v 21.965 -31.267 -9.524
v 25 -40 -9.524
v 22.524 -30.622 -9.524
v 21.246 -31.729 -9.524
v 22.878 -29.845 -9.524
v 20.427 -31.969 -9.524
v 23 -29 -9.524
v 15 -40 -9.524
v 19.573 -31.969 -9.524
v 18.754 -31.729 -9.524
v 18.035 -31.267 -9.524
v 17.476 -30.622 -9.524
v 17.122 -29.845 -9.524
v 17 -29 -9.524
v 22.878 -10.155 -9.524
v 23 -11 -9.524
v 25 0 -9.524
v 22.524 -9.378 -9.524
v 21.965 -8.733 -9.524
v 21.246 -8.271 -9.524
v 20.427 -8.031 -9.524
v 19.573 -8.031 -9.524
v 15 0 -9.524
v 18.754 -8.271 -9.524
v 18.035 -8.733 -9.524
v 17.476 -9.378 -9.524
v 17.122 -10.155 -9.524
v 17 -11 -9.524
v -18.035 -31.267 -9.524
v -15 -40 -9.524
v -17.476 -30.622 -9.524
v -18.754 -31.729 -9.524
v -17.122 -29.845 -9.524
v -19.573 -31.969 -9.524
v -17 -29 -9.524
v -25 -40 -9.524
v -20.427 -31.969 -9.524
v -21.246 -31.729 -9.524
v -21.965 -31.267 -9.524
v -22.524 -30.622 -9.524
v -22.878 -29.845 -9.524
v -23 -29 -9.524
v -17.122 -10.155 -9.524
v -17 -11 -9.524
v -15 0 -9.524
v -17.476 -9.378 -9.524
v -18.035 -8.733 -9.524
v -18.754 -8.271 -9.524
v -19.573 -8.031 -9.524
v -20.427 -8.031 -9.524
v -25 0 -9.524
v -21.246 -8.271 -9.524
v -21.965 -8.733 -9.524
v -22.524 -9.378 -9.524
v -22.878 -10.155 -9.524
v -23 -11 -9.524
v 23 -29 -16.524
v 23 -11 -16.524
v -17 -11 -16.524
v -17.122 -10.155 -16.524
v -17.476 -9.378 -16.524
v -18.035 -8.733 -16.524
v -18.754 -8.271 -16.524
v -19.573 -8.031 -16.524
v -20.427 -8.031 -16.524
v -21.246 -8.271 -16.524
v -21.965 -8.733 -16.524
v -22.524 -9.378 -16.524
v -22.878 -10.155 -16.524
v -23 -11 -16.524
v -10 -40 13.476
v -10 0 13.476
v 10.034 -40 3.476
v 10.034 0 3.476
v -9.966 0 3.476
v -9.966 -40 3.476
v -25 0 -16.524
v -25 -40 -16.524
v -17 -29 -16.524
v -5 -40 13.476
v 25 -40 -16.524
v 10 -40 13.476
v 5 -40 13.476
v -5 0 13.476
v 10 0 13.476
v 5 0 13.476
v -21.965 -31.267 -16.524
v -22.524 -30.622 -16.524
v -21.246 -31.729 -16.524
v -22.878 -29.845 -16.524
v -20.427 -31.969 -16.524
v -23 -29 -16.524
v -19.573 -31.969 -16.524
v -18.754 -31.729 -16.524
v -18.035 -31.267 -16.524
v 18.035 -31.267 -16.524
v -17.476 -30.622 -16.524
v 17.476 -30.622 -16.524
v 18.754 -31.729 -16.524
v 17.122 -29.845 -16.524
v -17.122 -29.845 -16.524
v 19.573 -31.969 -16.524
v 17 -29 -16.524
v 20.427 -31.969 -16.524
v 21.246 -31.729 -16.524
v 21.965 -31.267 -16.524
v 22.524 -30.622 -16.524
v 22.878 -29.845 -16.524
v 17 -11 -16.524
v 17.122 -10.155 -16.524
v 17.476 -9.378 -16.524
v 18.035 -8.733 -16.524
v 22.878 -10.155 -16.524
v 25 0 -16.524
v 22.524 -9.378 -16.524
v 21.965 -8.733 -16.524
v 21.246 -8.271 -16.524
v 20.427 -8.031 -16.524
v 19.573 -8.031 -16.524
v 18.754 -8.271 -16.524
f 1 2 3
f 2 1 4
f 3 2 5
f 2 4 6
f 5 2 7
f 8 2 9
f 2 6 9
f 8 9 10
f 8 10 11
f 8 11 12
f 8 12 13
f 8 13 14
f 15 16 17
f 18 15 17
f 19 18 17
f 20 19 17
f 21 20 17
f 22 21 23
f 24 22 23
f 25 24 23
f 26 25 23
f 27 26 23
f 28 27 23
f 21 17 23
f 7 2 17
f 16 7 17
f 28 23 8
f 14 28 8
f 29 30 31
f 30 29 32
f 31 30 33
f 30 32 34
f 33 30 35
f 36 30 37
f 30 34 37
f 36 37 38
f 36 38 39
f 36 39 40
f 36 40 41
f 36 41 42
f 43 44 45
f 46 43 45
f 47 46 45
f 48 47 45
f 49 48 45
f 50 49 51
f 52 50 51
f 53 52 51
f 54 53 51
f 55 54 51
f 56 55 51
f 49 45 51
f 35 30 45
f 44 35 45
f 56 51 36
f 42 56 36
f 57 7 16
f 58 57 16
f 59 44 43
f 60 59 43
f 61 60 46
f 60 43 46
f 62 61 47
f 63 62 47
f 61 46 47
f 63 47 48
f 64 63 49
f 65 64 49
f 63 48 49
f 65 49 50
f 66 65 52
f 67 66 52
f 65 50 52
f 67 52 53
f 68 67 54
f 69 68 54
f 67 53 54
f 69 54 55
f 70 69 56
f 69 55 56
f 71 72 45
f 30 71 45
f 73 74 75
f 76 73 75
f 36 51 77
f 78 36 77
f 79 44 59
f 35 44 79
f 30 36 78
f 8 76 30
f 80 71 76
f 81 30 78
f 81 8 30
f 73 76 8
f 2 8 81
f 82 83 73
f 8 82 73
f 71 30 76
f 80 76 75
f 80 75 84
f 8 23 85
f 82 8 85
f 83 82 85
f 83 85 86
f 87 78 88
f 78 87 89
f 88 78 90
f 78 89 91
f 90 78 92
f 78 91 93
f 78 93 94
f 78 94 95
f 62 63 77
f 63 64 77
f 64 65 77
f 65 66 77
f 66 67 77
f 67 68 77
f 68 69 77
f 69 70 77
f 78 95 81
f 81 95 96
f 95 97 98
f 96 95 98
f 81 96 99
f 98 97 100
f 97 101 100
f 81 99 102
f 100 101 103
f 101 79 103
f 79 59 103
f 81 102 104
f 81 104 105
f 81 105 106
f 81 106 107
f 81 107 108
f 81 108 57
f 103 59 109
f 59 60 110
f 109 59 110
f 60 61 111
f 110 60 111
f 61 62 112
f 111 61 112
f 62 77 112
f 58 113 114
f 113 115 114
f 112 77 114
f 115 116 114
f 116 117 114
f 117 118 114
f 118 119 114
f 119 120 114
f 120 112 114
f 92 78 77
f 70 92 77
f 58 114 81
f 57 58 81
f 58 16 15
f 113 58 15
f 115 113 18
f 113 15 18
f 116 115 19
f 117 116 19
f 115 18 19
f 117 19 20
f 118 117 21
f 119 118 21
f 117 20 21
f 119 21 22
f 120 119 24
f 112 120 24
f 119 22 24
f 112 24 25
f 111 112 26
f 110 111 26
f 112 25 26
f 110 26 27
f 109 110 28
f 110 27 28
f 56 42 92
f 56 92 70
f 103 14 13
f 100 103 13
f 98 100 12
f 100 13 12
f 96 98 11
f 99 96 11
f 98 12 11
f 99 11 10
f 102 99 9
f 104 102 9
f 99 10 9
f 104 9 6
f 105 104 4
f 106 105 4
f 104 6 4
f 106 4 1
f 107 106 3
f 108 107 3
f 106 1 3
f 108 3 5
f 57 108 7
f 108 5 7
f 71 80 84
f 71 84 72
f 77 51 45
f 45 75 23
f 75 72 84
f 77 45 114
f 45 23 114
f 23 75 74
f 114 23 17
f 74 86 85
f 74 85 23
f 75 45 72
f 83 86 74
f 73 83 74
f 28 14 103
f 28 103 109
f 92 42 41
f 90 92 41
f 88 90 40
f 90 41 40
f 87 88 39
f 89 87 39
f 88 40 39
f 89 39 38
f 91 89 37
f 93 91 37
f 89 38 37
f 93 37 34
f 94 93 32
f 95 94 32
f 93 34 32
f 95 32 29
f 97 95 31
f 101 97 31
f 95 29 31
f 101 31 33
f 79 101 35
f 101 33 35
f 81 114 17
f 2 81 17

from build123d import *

# Parameters (mm, degrees)
PAD_DEPTH       = 40
POCKET_DEPTH    = 7.001
POCKET001_DEPTH = 7.001


with BuildPart() as part:
    # Sketch → Pad (new body)
    with BuildSketch(Plane.XZ):
        Polygon((-25, -16.524014), (25, -16.524014), (25, -9.524014), (15, -9.524014), (10, 13.475986), (5, 13.475986), (10.03446, 3.475986), (-9.96554, 3.475986), (-5, 13.475986), (-10, 13.475986), (-15, -9.524014), (-25, -9.524014), align=None)
    extrude(amount=PAD_DEPTH)

    # Sketch001 → Pocket (cut, through all)
    with BuildSketch(Plane(origin=(0, 0, -9.524014), x_dir=(-1, 0, 0), z_dir=(0, 0, 1))):
        with BuildLine():
            ThreePointArc((-17, 29), (-20, 32), (-23, 29))
            Line((-23, 29), (-23, 11))
            ThreePointArc((-23, 11), (-20, 8), (-17, 11))
            Line((-17, 29), (-17, 11))
        make_face()
    extrude(amount=-POCKET_DEPTH, mode=Mode.SUBTRACT)

    # Sketch002 → Pocket001 (cut, through all)
    with BuildSketch(Plane(origin=(0, 0, -9.524014), x_dir=(-1, 0, 0), z_dir=(0, 0, 1))):
        with BuildLine():
            ThreePointArc((23, 29), (20, 32), (17, 29))
            Line((17, 11), (17, 29))
            ThreePointArc((17, 11), (20, 8), (23, 11))
            Line((23, 29), (23, 11))
        make_face()
    extrude(amount=-POCKET001_DEPTH, mode=Mode.SUBTRACT)


solid = part.part
